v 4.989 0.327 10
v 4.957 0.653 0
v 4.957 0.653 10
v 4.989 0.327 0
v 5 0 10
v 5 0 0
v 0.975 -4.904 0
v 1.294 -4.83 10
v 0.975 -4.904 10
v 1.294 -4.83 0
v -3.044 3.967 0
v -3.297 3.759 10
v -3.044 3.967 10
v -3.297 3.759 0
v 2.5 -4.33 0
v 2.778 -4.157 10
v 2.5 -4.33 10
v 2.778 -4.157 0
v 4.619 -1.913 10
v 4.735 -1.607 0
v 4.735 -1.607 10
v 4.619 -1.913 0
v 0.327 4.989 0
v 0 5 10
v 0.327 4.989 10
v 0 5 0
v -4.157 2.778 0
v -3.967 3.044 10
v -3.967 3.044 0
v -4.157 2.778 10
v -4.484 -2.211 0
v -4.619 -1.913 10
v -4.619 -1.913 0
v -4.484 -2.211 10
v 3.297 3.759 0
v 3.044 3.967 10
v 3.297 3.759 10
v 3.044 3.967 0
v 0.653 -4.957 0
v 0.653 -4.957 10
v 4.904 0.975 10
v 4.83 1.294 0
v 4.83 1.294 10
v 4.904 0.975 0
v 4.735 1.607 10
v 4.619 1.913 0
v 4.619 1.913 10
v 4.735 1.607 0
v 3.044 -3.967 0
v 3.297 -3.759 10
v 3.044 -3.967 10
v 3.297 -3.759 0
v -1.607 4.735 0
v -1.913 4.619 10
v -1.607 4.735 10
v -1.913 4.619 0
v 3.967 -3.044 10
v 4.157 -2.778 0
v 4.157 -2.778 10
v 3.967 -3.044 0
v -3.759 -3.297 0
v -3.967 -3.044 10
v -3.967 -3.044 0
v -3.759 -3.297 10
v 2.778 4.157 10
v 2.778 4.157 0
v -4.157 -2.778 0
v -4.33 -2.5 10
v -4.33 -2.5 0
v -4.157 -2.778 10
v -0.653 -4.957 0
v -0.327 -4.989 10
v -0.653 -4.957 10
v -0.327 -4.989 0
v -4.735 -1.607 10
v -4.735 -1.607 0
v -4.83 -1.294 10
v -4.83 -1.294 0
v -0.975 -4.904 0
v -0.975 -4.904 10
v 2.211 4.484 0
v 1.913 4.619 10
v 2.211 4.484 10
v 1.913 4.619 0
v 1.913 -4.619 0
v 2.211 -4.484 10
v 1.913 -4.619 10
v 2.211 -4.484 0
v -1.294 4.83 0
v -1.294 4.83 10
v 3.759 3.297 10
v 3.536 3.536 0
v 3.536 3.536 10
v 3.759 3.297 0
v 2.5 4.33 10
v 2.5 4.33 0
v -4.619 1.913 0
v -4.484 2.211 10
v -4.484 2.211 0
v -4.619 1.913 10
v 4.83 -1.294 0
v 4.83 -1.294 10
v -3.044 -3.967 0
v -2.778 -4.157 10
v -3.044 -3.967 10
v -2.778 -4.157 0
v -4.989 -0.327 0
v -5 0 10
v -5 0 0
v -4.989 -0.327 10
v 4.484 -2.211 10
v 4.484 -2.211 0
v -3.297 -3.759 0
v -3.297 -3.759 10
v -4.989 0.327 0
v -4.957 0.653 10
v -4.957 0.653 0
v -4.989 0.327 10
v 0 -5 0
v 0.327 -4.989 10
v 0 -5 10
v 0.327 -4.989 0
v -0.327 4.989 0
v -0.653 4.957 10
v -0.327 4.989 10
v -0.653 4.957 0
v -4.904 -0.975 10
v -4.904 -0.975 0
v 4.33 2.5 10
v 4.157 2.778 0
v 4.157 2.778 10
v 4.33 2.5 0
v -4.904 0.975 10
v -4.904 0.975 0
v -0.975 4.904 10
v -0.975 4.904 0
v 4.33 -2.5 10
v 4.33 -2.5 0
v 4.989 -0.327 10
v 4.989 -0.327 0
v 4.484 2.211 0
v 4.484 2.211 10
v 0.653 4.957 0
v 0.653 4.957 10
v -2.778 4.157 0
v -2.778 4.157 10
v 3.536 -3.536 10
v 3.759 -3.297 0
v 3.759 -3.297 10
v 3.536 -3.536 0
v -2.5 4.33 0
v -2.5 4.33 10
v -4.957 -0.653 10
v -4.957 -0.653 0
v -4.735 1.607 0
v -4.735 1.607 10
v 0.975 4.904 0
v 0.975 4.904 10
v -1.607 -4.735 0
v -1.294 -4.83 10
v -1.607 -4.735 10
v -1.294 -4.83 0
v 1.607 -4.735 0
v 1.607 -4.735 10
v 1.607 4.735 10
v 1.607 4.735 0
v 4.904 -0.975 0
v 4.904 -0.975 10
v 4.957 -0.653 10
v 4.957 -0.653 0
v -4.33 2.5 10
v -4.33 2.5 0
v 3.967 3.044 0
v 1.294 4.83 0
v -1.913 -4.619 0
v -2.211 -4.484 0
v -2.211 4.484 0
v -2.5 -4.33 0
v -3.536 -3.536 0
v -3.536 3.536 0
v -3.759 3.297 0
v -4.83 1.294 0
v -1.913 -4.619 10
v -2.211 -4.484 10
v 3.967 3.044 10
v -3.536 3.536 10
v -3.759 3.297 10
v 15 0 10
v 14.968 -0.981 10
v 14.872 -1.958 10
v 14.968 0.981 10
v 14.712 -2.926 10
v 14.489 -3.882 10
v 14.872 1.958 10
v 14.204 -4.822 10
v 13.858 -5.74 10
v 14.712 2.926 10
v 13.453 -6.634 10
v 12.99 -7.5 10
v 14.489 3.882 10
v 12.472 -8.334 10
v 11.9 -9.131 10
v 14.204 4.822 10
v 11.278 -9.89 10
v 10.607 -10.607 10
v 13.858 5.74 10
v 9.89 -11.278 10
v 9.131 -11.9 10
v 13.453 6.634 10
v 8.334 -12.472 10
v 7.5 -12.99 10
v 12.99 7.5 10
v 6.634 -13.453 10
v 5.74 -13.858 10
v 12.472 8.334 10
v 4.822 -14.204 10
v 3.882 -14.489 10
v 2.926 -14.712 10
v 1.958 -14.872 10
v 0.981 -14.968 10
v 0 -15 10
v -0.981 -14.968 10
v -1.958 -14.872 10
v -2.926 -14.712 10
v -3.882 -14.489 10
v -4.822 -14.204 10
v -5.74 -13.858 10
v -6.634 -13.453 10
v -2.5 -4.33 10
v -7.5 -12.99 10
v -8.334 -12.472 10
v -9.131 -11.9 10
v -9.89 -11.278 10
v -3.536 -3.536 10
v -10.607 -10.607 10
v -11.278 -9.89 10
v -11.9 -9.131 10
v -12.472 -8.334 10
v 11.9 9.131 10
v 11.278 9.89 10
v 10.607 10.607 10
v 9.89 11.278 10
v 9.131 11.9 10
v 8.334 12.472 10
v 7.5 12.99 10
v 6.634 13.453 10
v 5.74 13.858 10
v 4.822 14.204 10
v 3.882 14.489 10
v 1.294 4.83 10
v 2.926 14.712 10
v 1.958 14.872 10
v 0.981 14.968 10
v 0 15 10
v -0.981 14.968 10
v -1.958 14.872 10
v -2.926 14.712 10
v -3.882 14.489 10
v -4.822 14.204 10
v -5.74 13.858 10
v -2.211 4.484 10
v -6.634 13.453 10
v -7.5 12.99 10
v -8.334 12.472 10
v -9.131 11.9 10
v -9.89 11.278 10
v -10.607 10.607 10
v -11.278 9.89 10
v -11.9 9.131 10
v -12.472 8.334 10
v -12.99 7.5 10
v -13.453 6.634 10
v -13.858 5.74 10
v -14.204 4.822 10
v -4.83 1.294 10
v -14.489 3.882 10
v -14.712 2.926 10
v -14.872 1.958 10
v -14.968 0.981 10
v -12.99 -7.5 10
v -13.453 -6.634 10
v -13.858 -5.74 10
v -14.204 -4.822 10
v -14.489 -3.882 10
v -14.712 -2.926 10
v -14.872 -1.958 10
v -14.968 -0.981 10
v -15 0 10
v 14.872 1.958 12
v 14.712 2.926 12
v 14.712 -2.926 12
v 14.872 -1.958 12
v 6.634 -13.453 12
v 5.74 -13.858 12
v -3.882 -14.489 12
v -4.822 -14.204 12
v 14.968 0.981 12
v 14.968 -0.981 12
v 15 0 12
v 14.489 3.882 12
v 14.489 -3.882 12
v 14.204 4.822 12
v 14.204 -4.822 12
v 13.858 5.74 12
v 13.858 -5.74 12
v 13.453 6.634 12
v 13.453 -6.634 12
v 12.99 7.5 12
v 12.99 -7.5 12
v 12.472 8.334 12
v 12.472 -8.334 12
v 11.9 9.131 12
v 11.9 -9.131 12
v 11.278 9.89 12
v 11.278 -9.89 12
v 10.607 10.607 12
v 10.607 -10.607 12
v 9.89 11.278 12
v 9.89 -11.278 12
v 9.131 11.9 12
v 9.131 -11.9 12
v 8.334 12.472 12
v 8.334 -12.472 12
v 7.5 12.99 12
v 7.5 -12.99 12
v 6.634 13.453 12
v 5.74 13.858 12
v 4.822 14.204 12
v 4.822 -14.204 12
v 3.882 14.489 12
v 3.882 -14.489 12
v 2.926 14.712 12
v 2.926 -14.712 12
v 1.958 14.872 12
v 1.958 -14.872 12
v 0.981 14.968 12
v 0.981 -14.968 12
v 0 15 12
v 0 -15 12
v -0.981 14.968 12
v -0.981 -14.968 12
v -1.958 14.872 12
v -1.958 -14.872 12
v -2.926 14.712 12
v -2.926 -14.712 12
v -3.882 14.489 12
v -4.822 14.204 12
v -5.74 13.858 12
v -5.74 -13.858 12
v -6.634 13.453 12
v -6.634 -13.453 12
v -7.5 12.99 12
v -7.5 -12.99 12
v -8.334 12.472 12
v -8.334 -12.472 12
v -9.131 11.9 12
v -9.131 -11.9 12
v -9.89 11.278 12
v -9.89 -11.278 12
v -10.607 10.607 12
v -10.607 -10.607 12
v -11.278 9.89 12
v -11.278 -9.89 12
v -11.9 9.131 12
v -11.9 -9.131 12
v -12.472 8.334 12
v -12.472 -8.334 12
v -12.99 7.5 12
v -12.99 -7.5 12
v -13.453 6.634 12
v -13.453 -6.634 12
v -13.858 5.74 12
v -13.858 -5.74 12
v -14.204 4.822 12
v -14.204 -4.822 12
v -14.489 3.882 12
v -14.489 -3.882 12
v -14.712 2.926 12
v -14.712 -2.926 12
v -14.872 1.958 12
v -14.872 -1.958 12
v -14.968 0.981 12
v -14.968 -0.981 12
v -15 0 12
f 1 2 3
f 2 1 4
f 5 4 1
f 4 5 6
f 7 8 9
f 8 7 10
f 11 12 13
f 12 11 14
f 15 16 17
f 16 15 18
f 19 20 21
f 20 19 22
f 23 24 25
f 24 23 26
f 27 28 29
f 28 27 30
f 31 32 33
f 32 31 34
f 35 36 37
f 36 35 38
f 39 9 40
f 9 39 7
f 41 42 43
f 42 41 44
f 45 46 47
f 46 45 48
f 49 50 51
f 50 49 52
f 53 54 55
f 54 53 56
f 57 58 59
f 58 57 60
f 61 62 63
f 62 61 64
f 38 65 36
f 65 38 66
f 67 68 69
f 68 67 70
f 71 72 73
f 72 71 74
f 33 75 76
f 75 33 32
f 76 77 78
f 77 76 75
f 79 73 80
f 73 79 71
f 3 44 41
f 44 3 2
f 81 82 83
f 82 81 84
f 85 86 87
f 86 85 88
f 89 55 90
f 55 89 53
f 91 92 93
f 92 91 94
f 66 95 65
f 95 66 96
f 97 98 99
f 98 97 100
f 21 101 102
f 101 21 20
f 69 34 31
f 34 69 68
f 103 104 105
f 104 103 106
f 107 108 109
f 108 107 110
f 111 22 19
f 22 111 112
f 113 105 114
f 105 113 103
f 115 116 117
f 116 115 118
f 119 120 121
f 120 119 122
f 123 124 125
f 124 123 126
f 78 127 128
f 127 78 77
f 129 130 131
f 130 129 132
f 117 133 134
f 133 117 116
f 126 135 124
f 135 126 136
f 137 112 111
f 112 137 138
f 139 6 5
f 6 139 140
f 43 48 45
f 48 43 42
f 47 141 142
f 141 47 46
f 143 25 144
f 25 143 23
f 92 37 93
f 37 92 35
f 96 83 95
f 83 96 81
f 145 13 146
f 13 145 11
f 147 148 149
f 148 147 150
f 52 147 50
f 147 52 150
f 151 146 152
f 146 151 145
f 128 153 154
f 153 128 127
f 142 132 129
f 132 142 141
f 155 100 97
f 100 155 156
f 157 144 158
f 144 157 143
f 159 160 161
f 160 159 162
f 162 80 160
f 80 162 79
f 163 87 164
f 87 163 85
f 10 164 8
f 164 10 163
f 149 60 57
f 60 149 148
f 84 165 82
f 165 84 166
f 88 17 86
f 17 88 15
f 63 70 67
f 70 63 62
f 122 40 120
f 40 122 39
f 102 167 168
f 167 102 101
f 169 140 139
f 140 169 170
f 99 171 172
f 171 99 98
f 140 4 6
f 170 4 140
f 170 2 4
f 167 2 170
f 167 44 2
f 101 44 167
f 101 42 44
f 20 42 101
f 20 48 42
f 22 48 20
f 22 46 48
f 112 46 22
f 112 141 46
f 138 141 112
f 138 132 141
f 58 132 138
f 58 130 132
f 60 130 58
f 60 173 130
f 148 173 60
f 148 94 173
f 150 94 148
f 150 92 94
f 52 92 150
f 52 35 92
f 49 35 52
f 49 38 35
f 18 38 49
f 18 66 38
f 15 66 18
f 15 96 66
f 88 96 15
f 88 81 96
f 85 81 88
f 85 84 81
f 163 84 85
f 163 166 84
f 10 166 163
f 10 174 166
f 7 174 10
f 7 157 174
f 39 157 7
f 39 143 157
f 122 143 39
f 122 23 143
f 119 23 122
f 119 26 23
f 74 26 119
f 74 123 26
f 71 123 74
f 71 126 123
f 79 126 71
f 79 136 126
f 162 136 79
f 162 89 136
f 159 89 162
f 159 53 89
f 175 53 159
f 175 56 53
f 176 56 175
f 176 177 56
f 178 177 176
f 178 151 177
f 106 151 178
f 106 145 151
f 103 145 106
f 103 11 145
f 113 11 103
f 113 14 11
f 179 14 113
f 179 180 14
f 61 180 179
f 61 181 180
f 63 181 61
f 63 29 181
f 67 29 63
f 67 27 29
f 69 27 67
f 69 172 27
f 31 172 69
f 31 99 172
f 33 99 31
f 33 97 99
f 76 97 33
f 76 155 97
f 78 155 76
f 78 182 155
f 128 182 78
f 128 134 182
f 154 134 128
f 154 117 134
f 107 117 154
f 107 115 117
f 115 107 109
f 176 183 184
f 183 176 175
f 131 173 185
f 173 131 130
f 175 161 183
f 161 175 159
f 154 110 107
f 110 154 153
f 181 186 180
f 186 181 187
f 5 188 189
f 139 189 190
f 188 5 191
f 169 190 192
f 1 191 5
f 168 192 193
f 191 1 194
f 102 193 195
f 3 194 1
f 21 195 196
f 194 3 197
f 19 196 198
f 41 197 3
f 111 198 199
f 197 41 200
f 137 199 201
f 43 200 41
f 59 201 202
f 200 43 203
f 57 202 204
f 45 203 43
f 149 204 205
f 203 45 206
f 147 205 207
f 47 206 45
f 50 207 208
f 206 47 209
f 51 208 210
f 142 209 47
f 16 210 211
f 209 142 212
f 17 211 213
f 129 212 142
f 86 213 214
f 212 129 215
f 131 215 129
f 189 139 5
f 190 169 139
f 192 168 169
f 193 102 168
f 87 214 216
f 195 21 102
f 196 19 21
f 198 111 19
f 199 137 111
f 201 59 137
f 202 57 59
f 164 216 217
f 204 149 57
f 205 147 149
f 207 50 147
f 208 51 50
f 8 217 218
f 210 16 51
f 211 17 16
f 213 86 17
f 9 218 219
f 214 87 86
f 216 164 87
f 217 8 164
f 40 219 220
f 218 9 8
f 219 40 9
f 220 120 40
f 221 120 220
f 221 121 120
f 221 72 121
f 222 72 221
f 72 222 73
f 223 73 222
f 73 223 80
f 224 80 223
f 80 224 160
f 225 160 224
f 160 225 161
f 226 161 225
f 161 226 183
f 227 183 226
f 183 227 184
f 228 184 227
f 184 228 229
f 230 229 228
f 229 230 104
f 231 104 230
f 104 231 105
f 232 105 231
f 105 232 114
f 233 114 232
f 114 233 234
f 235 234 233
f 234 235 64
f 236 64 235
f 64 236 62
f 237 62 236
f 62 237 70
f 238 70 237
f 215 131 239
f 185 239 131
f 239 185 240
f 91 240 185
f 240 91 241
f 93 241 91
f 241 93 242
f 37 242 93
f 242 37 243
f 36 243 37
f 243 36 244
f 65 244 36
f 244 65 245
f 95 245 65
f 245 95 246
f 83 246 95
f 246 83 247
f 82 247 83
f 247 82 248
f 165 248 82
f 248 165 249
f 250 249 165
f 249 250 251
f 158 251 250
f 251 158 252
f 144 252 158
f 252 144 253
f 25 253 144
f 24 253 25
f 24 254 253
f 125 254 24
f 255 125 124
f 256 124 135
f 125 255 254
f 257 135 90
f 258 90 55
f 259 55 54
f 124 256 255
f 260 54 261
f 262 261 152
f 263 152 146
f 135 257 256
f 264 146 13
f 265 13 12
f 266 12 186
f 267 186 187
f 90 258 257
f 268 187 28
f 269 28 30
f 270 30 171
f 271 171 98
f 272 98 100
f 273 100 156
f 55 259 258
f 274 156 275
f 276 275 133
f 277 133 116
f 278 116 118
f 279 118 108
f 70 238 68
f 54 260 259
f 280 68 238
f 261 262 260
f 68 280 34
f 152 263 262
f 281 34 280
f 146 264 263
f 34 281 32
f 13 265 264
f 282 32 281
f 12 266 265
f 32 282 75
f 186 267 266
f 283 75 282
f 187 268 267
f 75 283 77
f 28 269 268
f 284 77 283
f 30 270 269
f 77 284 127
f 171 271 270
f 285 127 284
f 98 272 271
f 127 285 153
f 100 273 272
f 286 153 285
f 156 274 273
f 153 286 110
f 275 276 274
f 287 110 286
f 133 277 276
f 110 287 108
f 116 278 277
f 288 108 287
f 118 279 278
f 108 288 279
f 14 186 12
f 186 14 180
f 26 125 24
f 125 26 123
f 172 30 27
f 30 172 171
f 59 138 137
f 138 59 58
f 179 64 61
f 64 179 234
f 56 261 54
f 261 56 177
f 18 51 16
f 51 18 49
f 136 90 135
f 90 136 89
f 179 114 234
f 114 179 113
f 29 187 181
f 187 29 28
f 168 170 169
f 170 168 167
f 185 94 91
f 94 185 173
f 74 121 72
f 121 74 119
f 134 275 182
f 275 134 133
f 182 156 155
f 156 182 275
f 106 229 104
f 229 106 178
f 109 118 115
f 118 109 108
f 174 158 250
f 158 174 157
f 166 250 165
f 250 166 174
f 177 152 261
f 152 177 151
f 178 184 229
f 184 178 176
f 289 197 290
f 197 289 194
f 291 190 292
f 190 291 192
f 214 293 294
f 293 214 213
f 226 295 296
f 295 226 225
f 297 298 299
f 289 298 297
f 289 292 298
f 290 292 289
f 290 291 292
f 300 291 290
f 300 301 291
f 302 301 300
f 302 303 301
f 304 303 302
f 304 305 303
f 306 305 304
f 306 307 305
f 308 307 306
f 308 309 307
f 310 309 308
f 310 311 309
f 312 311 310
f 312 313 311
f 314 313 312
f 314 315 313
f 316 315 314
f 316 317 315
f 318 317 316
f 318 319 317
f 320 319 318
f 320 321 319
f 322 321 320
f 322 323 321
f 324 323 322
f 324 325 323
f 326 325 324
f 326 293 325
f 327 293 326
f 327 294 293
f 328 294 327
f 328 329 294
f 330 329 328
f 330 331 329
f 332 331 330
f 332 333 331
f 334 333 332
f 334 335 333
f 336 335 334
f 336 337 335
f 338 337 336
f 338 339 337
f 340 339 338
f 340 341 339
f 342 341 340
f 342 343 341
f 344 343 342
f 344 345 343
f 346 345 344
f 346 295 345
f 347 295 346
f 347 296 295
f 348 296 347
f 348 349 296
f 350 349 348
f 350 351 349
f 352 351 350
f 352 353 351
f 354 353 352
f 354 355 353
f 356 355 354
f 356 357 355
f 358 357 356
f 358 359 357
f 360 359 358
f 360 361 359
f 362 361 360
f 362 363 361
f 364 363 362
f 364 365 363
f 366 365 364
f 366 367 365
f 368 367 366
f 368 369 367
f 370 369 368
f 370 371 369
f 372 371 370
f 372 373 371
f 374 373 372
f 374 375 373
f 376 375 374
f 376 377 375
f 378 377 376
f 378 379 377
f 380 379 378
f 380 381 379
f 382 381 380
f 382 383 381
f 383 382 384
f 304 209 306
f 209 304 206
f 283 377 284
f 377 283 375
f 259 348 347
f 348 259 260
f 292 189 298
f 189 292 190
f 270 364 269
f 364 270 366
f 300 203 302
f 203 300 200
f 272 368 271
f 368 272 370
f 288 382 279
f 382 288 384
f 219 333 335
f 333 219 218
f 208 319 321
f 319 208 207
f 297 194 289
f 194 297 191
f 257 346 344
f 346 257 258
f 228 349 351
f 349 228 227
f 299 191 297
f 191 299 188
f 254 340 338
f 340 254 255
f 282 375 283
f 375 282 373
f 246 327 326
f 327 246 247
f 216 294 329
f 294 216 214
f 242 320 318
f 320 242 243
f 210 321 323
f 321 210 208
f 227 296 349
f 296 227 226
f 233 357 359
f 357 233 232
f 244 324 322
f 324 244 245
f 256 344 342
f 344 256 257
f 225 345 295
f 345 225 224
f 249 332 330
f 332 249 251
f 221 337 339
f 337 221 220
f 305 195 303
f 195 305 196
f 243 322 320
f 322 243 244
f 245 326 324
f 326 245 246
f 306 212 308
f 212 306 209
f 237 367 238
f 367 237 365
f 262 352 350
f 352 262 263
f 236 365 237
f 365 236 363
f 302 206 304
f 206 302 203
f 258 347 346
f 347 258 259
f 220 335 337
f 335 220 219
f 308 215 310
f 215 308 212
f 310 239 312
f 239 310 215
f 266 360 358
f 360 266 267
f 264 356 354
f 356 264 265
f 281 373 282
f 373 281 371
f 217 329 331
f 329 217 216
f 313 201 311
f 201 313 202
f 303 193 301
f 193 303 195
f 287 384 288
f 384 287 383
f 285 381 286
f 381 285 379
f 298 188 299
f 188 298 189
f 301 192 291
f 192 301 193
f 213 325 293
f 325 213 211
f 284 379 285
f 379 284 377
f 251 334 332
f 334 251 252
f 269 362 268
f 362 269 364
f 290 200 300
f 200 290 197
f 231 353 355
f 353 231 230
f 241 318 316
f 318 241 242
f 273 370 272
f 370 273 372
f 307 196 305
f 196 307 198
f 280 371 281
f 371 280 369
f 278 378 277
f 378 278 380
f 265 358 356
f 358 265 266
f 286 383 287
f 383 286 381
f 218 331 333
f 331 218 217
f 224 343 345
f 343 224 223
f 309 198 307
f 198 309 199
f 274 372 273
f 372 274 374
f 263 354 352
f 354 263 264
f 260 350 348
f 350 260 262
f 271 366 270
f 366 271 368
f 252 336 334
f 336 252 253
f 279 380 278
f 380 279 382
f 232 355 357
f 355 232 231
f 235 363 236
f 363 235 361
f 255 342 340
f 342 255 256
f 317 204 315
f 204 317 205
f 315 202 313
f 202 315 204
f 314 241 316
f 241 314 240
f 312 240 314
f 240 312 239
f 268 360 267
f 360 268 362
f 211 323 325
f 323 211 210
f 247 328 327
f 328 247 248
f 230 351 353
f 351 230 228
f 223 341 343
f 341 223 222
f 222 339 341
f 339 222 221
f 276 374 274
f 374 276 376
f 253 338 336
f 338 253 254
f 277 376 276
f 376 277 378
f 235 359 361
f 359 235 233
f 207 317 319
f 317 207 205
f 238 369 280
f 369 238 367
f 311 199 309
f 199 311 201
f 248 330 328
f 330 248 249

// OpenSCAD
// mushroom: post r5 h10 + flat disk r15 h2 on top. Support = annulus pi*(15^2-5^2)=628.3 * 10 = 6283 mm^3.
$fn = 96;
cylinder(h = 10, r = 5);
translate([0,0,10]) cylinder(h = 2, r = 15);
